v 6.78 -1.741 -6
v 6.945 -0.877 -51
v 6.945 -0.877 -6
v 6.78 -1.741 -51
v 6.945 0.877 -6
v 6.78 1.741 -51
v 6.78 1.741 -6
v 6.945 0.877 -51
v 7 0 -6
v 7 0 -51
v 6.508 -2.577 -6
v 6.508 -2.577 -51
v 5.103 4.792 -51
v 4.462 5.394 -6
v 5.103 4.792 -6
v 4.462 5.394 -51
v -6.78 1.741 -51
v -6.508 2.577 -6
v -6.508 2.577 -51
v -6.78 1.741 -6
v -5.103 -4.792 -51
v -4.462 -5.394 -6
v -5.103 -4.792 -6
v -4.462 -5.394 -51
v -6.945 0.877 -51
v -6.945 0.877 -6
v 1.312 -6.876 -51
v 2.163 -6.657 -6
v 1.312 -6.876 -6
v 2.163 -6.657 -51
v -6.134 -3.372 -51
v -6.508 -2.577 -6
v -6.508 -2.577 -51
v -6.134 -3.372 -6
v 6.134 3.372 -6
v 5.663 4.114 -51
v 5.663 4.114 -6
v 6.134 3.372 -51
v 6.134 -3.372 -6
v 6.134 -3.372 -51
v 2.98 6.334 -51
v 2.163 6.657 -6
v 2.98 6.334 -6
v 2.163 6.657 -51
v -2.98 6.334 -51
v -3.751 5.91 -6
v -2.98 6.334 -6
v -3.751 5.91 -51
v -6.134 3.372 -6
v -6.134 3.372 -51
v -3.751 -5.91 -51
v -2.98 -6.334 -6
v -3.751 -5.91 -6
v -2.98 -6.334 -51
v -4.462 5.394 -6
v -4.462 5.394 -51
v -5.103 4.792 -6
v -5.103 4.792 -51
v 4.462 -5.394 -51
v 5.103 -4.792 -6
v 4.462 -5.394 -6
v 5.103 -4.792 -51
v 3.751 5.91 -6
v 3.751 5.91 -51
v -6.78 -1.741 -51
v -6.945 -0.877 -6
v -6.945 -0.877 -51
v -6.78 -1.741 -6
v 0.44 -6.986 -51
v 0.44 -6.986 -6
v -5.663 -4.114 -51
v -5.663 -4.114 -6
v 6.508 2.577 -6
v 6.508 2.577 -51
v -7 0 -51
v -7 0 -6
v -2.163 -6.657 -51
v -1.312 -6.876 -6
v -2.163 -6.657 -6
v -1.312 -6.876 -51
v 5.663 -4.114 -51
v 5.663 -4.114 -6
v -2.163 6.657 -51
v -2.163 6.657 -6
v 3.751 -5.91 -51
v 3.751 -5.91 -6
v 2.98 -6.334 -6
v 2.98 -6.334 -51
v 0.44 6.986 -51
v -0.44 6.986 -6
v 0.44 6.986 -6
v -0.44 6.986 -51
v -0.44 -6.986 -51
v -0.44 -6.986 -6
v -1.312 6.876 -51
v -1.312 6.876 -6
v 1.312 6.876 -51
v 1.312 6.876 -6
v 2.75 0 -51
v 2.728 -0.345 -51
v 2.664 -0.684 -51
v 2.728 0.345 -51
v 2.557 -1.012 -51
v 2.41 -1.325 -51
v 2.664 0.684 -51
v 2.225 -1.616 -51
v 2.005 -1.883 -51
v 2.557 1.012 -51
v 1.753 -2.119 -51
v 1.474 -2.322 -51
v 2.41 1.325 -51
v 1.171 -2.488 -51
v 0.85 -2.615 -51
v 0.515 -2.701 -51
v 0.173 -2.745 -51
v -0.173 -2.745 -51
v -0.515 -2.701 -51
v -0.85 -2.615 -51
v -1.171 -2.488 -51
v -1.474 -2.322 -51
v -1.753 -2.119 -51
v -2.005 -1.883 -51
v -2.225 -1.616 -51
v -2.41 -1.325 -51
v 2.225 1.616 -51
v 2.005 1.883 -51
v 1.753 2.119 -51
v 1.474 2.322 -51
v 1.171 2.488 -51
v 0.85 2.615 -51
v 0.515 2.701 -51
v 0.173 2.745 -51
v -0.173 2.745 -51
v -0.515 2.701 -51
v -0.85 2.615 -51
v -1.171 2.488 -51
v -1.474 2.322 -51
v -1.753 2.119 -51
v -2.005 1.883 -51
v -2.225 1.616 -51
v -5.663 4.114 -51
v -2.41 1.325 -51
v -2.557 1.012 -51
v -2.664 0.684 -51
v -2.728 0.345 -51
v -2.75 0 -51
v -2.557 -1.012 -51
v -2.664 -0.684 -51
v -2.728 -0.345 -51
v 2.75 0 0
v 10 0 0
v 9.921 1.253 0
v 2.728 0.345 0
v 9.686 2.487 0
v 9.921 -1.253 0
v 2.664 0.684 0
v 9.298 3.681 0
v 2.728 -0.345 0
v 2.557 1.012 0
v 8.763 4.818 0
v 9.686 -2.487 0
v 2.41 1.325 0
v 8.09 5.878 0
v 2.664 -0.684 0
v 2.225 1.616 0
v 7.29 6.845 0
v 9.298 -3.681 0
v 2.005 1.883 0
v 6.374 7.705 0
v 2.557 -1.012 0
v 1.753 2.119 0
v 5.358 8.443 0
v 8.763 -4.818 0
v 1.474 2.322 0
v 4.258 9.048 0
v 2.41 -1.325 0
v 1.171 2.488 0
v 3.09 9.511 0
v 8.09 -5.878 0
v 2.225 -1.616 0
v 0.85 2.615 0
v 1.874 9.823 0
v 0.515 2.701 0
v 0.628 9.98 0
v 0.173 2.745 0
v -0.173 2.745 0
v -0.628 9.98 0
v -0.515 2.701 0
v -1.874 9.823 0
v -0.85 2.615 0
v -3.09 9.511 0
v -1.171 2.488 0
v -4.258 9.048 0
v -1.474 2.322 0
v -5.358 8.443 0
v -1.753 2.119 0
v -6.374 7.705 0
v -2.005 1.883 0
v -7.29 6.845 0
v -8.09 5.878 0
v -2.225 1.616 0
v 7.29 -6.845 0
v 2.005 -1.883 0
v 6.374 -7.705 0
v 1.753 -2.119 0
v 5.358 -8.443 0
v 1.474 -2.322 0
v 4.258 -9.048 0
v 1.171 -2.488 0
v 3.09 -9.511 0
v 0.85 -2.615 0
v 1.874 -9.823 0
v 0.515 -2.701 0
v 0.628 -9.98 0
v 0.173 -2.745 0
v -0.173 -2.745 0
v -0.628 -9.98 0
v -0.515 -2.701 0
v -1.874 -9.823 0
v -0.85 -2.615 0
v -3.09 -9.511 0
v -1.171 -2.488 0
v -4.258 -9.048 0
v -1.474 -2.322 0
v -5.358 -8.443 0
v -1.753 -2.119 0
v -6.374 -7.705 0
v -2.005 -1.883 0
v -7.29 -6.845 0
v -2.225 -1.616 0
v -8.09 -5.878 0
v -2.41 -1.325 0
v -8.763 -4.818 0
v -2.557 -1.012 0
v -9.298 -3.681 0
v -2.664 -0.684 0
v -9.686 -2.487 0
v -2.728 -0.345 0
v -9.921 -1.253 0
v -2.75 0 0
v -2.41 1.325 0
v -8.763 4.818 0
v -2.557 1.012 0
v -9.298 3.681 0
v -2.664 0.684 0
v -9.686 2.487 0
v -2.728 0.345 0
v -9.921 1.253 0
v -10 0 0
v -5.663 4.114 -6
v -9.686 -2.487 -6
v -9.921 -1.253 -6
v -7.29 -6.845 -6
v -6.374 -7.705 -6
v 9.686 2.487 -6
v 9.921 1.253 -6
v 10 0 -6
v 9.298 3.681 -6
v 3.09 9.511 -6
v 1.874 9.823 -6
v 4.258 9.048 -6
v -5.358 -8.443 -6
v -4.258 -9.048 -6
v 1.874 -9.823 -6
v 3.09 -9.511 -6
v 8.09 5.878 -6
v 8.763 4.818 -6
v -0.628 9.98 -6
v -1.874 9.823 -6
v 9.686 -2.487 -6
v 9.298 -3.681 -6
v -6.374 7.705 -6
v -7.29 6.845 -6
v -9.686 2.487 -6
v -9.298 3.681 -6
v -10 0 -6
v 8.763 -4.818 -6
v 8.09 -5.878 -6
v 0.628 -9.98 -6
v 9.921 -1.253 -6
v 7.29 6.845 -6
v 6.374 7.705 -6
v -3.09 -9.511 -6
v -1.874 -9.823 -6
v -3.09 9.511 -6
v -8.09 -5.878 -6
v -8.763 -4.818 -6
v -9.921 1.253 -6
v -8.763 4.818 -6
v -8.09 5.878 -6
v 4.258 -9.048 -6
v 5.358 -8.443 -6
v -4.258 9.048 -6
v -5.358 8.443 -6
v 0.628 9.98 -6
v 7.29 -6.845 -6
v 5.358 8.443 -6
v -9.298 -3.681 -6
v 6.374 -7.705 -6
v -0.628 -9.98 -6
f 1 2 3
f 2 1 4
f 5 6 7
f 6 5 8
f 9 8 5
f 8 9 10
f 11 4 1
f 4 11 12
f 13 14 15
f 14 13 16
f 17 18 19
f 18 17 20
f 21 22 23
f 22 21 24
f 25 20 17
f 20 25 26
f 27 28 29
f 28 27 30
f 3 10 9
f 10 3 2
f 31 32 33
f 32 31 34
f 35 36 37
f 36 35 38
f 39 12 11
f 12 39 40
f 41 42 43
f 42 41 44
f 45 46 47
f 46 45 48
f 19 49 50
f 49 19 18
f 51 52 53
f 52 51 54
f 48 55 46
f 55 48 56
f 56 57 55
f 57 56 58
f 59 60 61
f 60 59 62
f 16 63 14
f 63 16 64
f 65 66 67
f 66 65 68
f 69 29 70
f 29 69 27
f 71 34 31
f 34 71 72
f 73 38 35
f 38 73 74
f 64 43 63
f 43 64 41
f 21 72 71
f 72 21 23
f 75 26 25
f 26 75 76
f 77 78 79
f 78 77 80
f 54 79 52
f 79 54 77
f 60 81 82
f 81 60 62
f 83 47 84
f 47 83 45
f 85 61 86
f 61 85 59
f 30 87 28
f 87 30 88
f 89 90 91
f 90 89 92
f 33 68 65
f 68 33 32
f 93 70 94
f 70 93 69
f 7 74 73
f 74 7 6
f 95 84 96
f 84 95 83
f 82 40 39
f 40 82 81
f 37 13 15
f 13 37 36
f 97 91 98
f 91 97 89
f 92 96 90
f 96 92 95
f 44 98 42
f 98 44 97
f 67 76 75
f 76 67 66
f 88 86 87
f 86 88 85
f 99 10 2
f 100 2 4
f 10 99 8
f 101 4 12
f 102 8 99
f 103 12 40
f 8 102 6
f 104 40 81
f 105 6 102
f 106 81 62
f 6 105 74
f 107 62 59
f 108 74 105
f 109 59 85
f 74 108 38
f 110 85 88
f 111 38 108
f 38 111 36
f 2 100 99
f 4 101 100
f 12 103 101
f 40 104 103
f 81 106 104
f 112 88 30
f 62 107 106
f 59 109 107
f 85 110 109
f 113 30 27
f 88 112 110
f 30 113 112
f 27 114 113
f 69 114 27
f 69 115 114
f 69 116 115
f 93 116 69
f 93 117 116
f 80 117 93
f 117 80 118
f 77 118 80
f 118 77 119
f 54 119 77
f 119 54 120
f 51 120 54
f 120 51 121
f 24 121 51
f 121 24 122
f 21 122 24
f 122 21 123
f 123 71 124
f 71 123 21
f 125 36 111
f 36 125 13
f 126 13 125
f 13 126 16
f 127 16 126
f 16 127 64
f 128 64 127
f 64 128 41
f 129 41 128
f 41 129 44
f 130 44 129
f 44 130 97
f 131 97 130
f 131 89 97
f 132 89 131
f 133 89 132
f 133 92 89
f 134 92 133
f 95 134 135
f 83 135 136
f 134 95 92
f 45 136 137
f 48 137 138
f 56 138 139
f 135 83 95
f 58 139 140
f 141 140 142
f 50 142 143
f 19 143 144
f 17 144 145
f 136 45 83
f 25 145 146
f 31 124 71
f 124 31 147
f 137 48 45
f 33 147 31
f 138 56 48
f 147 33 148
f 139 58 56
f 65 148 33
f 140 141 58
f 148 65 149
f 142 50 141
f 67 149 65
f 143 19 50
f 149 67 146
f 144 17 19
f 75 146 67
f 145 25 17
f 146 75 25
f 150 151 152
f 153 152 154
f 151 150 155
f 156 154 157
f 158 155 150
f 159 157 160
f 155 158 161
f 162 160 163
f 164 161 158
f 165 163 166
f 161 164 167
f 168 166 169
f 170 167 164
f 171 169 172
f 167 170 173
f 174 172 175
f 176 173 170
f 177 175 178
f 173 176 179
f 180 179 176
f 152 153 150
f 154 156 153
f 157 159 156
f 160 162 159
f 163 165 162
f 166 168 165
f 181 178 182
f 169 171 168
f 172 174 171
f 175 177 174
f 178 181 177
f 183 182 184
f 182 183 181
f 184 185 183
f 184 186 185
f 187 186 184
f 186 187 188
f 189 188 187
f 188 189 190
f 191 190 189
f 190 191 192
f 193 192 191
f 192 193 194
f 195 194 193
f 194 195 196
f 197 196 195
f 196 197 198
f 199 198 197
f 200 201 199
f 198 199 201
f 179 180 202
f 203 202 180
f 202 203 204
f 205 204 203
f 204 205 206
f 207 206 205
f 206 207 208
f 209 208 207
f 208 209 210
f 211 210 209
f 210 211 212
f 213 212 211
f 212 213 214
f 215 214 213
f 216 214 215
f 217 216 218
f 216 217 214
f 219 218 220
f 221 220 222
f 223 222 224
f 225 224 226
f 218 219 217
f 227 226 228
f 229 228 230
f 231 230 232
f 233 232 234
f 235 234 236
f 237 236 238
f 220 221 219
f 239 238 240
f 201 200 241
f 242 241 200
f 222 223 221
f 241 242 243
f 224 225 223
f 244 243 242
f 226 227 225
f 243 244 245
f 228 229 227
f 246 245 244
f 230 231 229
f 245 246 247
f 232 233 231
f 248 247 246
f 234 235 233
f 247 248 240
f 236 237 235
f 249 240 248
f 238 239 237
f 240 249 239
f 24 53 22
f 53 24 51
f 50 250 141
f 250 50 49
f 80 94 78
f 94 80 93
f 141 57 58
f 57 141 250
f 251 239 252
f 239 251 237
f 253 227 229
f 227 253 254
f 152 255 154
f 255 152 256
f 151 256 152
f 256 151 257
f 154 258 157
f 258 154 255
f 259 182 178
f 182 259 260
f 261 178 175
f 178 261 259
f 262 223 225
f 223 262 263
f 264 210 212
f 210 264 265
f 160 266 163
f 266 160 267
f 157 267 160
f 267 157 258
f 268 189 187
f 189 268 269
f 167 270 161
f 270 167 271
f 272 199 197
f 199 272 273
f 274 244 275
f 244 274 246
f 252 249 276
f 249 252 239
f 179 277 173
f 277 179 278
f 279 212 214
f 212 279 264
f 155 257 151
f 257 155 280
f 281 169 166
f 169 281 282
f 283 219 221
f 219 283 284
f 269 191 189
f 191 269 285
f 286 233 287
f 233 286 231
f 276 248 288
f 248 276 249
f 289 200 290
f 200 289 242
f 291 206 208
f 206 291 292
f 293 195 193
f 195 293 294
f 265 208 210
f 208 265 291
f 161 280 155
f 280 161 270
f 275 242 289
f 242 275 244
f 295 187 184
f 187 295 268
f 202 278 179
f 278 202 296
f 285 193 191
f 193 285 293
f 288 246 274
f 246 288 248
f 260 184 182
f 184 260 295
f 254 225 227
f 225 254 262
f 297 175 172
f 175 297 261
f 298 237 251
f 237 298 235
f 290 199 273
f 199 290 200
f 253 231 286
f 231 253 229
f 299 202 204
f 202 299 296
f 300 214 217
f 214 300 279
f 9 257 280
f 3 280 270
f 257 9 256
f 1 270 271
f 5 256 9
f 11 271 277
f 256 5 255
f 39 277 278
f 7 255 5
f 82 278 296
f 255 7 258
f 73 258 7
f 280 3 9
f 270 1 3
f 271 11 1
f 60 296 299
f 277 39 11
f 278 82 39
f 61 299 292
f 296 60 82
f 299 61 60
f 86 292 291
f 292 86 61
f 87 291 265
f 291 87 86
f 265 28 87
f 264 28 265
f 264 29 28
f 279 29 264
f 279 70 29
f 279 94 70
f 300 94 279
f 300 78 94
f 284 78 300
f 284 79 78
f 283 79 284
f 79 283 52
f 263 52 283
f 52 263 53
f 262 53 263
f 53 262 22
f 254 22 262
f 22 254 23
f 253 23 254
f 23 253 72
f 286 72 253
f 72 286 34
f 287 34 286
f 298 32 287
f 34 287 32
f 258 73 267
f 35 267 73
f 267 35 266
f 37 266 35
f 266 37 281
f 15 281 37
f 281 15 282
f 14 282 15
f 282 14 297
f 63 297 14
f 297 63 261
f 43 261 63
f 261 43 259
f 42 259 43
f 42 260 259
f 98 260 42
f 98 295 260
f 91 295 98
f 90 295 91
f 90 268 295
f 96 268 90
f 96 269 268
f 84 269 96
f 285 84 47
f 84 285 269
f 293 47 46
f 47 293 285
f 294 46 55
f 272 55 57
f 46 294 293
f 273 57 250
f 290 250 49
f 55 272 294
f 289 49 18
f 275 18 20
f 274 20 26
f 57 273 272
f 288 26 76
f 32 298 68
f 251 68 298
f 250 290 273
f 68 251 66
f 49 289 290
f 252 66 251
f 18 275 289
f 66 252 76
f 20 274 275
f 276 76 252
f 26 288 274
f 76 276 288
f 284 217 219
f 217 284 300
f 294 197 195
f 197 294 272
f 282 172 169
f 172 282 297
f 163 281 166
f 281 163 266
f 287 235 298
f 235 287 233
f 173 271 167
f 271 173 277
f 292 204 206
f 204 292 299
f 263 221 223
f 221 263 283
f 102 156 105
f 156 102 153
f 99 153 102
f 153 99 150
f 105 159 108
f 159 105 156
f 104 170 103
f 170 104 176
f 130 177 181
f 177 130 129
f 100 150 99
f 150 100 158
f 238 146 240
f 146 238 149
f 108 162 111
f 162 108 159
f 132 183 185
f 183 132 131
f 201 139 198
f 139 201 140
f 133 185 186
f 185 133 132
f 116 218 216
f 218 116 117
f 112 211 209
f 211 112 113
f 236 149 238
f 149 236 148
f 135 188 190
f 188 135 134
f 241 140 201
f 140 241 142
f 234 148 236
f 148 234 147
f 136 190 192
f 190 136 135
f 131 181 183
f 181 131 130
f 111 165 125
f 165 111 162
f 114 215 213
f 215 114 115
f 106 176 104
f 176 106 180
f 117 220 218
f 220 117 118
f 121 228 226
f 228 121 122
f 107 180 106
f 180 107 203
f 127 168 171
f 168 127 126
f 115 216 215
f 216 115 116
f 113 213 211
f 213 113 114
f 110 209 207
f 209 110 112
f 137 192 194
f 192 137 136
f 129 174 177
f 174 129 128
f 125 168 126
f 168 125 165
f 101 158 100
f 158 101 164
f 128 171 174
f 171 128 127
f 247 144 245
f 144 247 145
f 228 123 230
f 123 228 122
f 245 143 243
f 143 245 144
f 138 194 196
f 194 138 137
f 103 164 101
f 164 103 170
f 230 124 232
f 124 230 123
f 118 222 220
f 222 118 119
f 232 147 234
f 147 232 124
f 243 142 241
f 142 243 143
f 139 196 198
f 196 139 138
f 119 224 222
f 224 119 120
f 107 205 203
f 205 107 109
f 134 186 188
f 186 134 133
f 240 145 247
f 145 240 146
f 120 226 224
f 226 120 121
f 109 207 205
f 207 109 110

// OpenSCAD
$fn = 50;


difference() {
	union() {
		translate(v = [0, 0, -51.0000000000]) {
			cylinder(h = 51, r = 7.0000000000);
		}
		translate(v = [0, 0, -6.0000000000]) {
			cylinder(h = 6, r = 10.0000000000);
		}
	}
	union() {
		#translate(v = [0, 0, -51]) {
			cylinder(h = 51, r = 2.7500000000);
		}
	}
}
